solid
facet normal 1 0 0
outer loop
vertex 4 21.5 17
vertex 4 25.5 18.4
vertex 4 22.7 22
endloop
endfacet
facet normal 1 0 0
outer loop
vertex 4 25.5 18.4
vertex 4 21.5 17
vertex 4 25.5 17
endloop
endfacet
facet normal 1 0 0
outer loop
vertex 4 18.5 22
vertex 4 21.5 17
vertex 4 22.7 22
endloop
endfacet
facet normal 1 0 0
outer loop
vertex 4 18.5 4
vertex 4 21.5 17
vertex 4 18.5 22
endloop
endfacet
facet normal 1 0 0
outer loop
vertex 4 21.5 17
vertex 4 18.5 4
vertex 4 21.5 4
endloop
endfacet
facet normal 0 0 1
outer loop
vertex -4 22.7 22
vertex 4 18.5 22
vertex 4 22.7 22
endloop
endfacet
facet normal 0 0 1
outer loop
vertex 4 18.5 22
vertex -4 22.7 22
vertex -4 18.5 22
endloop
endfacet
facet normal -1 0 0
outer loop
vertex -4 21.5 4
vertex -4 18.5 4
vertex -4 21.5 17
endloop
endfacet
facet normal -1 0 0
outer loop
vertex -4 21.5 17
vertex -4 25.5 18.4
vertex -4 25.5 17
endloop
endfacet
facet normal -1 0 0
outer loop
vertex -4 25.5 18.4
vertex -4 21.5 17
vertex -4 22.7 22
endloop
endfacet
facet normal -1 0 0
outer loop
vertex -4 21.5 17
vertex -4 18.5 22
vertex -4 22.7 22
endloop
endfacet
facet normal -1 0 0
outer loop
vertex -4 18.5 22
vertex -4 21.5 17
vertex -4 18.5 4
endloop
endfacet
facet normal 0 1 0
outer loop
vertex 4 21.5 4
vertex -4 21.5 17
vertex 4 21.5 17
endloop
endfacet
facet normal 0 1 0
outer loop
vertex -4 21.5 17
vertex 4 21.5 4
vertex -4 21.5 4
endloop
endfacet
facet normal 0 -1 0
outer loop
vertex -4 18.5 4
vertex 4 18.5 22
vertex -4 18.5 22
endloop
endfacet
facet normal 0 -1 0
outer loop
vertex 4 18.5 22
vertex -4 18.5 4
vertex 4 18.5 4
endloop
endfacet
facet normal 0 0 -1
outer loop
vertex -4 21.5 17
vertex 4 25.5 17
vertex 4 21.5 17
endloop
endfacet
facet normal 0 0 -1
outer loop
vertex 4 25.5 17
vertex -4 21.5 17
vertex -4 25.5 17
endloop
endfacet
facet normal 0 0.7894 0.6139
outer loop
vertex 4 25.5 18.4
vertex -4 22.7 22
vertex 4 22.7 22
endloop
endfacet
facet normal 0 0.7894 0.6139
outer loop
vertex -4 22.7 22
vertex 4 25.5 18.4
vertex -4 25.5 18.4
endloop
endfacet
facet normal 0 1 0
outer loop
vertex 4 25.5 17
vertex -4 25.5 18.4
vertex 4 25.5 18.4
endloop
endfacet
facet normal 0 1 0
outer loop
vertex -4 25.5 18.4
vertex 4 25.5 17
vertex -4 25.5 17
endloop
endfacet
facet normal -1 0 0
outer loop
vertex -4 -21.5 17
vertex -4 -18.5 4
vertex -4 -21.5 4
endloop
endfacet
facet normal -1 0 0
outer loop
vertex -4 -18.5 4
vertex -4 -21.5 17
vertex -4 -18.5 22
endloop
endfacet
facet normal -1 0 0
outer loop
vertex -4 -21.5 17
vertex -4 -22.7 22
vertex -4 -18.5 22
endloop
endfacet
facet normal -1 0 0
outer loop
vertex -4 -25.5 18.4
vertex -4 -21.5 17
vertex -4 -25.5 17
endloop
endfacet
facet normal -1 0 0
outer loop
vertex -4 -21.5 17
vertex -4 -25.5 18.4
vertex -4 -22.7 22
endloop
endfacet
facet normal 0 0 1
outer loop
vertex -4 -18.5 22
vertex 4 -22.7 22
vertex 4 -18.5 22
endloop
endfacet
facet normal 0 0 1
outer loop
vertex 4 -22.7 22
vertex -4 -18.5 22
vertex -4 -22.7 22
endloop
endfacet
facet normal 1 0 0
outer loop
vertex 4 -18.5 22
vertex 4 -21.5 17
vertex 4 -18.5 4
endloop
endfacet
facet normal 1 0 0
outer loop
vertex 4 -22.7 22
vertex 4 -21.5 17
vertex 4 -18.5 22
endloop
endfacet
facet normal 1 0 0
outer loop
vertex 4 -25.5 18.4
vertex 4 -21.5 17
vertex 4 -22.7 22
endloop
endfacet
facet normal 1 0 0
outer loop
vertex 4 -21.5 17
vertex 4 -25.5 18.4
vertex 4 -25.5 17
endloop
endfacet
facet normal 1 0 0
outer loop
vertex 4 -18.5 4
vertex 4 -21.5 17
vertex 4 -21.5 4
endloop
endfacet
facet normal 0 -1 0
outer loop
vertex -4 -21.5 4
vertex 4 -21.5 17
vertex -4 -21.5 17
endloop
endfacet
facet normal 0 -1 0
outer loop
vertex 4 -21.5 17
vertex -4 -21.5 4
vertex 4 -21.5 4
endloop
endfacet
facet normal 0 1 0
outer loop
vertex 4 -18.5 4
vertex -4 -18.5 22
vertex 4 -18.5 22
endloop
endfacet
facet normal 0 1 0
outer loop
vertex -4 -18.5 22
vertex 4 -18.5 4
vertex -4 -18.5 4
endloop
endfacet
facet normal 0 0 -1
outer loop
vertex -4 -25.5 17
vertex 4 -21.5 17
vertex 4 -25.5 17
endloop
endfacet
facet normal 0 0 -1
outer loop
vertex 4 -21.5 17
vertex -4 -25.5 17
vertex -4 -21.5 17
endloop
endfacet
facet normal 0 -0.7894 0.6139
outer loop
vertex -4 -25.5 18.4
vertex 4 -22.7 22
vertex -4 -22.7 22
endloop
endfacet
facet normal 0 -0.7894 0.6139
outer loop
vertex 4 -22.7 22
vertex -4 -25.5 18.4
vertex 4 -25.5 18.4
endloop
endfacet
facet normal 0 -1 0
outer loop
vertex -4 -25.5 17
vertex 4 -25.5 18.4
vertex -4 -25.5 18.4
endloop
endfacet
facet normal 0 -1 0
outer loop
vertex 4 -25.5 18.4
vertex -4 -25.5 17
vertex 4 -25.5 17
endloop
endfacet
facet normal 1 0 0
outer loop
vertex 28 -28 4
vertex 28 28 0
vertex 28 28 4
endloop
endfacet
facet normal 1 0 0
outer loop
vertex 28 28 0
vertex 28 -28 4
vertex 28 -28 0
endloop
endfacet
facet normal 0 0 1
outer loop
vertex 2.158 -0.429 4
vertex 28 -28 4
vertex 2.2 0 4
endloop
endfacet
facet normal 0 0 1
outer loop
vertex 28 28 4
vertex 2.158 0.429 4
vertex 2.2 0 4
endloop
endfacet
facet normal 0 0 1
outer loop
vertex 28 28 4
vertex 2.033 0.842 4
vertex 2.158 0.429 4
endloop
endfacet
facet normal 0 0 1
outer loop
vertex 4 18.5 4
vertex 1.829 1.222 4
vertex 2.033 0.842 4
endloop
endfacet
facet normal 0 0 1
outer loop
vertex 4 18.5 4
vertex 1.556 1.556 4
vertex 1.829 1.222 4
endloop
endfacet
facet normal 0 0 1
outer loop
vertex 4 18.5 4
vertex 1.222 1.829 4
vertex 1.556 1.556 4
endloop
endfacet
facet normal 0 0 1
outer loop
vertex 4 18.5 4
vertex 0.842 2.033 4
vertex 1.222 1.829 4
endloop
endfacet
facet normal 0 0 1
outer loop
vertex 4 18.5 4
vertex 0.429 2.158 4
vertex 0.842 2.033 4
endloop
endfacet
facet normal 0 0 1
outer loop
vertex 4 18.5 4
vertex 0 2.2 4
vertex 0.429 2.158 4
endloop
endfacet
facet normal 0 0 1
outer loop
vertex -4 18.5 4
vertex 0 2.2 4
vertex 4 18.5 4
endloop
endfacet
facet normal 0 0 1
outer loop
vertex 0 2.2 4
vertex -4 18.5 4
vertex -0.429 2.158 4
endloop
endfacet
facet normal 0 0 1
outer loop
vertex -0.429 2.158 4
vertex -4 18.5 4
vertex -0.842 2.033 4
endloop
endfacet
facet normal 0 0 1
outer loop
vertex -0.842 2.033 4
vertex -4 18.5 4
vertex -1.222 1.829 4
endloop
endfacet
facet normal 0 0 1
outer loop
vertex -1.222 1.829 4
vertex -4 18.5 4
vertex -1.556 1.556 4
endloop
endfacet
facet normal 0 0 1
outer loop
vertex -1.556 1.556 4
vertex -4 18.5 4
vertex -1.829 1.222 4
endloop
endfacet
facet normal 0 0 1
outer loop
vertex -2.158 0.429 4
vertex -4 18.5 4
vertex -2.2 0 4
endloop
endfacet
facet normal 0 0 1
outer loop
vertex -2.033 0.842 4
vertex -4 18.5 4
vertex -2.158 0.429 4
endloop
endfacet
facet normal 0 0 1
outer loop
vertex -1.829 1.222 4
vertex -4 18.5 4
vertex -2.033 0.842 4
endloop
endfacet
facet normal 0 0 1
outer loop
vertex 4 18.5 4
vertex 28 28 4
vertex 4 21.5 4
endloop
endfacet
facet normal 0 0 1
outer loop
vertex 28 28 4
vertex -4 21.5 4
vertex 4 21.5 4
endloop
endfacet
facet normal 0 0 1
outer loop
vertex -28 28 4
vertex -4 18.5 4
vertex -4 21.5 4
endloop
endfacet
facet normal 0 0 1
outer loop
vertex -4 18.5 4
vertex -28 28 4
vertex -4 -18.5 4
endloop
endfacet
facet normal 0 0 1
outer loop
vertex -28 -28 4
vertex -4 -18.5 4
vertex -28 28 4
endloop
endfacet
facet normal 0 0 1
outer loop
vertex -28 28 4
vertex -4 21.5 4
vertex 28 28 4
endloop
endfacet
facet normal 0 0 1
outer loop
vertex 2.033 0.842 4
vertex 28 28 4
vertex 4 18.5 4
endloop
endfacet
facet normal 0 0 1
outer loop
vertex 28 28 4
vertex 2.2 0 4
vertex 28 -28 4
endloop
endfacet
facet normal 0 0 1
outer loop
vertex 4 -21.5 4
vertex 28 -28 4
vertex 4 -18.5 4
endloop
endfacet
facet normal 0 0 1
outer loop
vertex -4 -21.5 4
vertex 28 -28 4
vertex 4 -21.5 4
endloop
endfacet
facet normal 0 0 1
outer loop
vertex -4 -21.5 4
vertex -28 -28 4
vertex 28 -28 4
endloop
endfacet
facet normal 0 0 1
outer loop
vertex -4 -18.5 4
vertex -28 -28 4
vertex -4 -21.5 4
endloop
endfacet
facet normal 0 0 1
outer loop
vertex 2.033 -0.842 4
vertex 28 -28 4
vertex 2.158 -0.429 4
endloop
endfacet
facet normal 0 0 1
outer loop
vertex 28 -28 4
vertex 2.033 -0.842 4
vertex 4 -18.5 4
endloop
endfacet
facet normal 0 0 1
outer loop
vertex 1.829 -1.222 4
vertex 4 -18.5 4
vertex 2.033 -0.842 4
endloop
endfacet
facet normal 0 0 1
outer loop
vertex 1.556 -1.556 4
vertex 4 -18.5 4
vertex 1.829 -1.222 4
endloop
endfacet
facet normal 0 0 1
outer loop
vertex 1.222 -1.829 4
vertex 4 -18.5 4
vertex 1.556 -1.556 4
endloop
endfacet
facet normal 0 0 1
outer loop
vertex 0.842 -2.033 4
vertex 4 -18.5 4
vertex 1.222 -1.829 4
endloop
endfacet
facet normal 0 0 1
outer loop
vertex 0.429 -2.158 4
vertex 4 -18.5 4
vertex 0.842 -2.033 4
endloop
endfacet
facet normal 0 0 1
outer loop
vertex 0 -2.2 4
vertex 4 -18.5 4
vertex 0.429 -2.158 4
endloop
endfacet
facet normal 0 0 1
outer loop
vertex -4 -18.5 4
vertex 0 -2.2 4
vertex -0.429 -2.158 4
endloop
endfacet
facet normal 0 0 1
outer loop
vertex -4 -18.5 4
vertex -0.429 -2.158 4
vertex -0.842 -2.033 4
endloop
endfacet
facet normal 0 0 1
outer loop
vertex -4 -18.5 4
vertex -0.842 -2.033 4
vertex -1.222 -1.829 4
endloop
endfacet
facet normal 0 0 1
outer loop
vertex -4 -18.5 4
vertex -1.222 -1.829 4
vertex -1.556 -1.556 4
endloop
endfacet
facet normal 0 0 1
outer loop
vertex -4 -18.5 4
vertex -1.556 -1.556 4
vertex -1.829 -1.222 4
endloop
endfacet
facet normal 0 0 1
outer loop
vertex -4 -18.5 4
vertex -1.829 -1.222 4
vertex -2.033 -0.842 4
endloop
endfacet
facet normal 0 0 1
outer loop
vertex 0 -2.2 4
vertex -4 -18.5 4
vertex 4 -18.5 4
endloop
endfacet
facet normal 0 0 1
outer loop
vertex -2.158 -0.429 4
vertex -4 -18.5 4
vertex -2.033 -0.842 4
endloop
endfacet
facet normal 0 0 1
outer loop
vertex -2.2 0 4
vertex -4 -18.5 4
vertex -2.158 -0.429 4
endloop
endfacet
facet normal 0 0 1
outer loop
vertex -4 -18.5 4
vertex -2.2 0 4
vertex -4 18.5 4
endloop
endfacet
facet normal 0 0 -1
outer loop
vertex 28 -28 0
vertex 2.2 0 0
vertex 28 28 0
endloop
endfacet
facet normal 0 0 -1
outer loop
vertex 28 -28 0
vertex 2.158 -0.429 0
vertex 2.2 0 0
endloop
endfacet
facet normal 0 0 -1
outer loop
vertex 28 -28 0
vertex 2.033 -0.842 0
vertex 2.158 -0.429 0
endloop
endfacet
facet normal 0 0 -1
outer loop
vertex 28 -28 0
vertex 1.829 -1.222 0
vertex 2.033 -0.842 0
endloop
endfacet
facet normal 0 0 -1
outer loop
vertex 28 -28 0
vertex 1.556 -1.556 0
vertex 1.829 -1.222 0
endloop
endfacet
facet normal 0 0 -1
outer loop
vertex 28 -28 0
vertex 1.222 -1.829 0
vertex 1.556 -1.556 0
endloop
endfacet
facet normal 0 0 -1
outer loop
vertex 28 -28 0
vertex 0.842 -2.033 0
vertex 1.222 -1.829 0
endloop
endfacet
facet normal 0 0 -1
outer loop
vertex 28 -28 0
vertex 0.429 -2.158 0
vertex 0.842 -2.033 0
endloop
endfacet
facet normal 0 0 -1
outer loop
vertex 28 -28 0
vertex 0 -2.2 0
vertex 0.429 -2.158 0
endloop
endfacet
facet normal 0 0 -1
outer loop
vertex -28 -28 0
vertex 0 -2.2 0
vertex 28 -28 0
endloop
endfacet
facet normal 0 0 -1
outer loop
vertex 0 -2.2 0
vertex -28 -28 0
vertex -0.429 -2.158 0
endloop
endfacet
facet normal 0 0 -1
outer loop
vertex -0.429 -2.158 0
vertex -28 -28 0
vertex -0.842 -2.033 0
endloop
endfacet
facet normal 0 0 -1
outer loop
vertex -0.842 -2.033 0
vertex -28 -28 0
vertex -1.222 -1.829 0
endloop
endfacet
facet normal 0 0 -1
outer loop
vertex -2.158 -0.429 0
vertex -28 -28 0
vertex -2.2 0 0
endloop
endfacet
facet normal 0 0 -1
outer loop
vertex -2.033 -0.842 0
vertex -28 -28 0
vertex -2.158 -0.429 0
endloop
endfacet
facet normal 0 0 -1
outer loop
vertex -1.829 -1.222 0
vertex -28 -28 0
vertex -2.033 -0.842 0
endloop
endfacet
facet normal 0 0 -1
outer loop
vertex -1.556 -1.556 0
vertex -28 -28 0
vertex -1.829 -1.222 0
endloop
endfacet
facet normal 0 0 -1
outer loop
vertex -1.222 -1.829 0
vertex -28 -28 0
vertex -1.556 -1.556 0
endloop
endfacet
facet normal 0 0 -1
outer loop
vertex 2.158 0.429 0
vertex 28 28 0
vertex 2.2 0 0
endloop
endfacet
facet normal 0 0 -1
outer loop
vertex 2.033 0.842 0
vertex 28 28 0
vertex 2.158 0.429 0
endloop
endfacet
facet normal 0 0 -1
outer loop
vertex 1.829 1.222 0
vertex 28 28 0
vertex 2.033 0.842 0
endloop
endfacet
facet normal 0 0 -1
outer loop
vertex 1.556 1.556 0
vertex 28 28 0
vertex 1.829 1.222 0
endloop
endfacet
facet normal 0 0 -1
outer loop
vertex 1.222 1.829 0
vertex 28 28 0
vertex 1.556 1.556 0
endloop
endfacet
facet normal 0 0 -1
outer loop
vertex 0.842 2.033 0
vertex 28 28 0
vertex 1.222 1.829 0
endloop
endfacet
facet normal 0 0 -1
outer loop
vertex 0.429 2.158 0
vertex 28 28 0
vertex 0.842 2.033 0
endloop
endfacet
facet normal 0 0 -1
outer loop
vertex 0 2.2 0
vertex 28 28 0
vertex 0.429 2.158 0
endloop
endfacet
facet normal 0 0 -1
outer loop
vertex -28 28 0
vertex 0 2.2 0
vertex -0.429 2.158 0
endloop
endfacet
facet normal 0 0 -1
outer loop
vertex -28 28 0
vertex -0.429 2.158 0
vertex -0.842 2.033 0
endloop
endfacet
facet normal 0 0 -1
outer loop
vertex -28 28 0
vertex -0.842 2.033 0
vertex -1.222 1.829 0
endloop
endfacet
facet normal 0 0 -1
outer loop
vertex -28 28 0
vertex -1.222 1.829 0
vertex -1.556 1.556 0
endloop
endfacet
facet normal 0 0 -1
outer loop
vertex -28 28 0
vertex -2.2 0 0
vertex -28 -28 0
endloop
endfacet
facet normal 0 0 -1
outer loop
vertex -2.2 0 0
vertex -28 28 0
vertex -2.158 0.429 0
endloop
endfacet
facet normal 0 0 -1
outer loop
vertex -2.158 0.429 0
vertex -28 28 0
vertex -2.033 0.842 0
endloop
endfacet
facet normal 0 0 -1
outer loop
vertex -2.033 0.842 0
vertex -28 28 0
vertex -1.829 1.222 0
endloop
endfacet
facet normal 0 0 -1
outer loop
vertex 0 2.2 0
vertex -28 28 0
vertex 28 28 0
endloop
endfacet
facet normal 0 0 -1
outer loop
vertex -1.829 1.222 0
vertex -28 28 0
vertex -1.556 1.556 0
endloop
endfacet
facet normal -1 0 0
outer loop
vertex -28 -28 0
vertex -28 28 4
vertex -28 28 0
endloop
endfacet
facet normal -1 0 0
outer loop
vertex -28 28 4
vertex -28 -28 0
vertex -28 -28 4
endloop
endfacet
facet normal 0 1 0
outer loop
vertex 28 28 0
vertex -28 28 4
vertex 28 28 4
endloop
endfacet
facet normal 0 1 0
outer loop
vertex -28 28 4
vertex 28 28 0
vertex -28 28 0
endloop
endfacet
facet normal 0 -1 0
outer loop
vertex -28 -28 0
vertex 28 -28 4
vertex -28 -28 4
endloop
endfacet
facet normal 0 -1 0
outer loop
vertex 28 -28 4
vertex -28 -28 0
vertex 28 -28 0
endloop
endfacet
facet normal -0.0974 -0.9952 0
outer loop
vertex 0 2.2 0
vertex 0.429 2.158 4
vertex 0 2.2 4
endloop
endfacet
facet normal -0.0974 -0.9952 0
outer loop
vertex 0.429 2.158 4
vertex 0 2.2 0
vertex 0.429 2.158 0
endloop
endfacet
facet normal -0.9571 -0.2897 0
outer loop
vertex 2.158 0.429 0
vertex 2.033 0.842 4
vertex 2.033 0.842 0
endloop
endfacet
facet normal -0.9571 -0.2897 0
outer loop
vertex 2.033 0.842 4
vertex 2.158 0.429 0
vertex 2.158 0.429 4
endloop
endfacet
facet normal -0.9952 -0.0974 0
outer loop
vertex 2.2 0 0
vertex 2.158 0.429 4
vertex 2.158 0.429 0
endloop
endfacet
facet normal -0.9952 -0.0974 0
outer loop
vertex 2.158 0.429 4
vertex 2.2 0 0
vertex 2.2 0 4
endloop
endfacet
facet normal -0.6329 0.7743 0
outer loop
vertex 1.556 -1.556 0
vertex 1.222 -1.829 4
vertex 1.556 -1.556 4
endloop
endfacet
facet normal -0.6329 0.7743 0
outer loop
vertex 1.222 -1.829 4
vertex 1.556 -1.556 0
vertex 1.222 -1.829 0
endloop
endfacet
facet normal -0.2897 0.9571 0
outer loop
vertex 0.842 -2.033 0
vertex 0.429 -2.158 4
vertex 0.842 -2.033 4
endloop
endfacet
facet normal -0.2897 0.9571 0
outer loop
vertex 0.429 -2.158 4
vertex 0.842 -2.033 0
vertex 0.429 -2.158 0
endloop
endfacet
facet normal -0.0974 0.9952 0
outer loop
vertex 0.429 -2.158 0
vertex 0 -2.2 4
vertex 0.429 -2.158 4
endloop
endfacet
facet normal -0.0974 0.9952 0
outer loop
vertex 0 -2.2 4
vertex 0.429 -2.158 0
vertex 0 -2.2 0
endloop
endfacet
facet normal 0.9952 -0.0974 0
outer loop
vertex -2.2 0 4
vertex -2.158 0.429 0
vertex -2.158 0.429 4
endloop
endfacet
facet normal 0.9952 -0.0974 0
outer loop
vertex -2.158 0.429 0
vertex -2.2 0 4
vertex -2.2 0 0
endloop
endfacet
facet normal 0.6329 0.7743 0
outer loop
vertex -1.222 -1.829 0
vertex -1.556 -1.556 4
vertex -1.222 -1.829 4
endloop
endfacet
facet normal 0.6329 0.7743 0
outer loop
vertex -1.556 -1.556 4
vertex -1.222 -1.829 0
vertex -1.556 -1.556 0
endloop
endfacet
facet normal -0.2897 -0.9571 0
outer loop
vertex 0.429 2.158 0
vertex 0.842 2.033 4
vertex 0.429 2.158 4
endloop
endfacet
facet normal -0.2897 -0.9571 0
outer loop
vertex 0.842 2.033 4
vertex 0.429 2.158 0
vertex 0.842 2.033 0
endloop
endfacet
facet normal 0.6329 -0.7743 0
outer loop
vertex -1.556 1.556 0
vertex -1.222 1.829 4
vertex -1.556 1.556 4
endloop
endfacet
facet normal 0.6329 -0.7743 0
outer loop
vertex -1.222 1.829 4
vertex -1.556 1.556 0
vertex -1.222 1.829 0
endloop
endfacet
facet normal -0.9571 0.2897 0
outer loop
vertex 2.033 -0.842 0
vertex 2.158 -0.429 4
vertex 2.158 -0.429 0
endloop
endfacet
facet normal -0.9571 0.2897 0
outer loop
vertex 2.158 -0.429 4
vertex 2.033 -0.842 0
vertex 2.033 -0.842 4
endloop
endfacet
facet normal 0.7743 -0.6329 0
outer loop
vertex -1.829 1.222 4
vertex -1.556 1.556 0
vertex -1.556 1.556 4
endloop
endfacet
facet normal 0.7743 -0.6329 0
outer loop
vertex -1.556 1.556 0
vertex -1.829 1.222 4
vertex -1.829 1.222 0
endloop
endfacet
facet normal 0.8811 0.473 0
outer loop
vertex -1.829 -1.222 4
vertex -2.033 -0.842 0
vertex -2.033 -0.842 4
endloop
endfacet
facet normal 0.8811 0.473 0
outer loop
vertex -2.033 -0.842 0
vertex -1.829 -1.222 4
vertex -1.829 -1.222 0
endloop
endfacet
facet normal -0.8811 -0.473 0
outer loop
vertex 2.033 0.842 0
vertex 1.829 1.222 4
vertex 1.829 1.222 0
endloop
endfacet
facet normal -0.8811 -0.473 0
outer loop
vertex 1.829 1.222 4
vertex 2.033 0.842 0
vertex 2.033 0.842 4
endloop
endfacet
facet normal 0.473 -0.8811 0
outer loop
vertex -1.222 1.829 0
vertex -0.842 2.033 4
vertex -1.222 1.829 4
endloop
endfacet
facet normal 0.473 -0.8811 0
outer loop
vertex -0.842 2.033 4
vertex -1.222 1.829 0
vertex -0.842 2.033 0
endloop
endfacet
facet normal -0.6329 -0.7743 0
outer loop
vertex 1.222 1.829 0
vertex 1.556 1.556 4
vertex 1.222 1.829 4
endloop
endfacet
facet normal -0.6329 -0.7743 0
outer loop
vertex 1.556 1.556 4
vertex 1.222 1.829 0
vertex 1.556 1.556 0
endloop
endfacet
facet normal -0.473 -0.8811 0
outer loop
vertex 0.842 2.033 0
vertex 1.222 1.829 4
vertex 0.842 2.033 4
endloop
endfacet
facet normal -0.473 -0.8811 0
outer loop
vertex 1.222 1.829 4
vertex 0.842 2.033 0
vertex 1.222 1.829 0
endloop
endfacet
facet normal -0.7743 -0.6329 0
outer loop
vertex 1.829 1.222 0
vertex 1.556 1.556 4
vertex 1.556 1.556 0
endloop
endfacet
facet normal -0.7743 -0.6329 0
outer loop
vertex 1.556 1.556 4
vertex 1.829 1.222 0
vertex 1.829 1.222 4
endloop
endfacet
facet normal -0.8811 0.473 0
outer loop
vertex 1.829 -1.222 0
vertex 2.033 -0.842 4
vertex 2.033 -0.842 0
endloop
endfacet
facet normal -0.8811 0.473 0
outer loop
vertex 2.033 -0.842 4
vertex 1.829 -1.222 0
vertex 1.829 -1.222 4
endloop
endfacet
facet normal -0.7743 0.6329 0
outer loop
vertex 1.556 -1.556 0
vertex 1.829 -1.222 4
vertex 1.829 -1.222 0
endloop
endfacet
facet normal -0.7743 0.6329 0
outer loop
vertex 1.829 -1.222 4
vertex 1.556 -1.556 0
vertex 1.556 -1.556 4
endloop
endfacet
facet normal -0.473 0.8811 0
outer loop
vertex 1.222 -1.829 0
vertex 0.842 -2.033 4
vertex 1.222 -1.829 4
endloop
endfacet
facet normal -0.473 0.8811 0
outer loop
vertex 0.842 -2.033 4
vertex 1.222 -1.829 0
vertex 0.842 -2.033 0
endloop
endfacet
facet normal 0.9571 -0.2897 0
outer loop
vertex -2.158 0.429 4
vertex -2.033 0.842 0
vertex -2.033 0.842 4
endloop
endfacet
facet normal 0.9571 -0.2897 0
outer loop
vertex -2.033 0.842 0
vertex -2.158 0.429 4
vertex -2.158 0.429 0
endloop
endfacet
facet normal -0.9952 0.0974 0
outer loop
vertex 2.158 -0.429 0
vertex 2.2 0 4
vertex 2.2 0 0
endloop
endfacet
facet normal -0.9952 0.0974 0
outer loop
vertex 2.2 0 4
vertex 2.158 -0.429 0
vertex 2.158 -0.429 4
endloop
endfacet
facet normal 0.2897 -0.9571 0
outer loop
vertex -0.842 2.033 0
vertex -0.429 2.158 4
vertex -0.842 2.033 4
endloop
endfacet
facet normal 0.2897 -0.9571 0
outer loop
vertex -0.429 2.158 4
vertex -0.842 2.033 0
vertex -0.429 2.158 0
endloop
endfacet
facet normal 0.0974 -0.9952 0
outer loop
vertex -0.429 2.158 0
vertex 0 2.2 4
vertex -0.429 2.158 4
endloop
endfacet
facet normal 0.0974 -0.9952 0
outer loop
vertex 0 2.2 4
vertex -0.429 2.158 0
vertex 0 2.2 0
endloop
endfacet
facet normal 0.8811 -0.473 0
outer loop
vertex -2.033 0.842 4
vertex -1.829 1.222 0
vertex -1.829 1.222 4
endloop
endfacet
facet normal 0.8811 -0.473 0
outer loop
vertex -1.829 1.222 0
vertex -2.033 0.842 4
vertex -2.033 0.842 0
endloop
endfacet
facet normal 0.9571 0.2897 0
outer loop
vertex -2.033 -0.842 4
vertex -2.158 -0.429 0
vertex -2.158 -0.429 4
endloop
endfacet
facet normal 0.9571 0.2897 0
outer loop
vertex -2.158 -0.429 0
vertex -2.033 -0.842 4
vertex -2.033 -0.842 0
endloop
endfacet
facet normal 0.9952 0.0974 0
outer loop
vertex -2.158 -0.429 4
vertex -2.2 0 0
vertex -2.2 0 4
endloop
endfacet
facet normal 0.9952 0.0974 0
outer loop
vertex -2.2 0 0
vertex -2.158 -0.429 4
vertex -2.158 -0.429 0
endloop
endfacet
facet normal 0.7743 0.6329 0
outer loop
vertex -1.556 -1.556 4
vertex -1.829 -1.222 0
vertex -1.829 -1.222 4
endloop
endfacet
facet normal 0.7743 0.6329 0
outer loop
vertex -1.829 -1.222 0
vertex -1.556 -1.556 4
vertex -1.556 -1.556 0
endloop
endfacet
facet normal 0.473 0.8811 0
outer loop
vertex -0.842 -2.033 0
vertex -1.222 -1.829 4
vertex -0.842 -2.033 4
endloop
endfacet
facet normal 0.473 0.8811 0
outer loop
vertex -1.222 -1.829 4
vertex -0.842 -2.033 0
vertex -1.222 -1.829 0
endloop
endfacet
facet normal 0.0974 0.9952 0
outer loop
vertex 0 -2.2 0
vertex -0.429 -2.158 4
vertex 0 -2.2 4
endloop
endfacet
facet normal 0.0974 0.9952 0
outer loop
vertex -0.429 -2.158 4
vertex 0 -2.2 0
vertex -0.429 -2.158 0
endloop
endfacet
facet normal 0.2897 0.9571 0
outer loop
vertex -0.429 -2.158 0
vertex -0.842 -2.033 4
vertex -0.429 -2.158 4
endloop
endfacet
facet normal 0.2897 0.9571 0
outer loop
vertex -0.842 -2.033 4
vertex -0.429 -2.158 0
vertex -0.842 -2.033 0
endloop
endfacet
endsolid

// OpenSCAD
$fn = 32;

// ----------------------------------------------------------------------
// Snap-fit latch: 2 arms, 18 mm tall, 4.2 mm undercut hooks
// ----------------------------------------------------------------------

// --- parameters (mm) ---
base_d = 56;              // base plate depth
base_h = 4;               // base plate thickness
span = 40;                // distance between opposite arms
arm_t = 3;                // arm thickness
arm_d = 8;                // arm width
height = 18;              // free arm length
head_len = 4.2;           // hook reach
head_h = 5;               // hook height
lead = 1.4;               // lead-in ramp thickness
bore_d = 4.4;             // base fixing bore
top_z = 22;               // height of the arm tips above the base

arms = 2;

difference() {
  union() {
    /* base plate, centred on the arm ring */
    translate([-28, -28, 0]) cube([base_d, base_d, base_h]);
    for (a = [0 : 360 / arms : 359]) rotate([0, 0, a]) {
    /* arm, sunk 0.5 mm into the base */
    translate([-arm_d / 2, span / 2 - arm_t / 2, base_h - 0.5]) cube([arm_d, arm_t, height + 0.5]);
    /* hook: a convex hull of a tall inner block and a thin outer lip
       gives a flat undercut below and a lead-in ramp on top */
    hull() {
      translate([-arm_d / 2, span / 2 + arm_t / 2 - 0.6, top_z - head_h]) cube([arm_d, lead + 0.4, head_h]);
      translate([-arm_d / 2, span / 2 + arm_t / 2 - 0.2, top_z - head_h]) cube([arm_d, head_len, lead]);
    }
    }
  }
  translate([0, 0, -2.5]) cylinder(h = base_h + 5, d = bore_d);
}
